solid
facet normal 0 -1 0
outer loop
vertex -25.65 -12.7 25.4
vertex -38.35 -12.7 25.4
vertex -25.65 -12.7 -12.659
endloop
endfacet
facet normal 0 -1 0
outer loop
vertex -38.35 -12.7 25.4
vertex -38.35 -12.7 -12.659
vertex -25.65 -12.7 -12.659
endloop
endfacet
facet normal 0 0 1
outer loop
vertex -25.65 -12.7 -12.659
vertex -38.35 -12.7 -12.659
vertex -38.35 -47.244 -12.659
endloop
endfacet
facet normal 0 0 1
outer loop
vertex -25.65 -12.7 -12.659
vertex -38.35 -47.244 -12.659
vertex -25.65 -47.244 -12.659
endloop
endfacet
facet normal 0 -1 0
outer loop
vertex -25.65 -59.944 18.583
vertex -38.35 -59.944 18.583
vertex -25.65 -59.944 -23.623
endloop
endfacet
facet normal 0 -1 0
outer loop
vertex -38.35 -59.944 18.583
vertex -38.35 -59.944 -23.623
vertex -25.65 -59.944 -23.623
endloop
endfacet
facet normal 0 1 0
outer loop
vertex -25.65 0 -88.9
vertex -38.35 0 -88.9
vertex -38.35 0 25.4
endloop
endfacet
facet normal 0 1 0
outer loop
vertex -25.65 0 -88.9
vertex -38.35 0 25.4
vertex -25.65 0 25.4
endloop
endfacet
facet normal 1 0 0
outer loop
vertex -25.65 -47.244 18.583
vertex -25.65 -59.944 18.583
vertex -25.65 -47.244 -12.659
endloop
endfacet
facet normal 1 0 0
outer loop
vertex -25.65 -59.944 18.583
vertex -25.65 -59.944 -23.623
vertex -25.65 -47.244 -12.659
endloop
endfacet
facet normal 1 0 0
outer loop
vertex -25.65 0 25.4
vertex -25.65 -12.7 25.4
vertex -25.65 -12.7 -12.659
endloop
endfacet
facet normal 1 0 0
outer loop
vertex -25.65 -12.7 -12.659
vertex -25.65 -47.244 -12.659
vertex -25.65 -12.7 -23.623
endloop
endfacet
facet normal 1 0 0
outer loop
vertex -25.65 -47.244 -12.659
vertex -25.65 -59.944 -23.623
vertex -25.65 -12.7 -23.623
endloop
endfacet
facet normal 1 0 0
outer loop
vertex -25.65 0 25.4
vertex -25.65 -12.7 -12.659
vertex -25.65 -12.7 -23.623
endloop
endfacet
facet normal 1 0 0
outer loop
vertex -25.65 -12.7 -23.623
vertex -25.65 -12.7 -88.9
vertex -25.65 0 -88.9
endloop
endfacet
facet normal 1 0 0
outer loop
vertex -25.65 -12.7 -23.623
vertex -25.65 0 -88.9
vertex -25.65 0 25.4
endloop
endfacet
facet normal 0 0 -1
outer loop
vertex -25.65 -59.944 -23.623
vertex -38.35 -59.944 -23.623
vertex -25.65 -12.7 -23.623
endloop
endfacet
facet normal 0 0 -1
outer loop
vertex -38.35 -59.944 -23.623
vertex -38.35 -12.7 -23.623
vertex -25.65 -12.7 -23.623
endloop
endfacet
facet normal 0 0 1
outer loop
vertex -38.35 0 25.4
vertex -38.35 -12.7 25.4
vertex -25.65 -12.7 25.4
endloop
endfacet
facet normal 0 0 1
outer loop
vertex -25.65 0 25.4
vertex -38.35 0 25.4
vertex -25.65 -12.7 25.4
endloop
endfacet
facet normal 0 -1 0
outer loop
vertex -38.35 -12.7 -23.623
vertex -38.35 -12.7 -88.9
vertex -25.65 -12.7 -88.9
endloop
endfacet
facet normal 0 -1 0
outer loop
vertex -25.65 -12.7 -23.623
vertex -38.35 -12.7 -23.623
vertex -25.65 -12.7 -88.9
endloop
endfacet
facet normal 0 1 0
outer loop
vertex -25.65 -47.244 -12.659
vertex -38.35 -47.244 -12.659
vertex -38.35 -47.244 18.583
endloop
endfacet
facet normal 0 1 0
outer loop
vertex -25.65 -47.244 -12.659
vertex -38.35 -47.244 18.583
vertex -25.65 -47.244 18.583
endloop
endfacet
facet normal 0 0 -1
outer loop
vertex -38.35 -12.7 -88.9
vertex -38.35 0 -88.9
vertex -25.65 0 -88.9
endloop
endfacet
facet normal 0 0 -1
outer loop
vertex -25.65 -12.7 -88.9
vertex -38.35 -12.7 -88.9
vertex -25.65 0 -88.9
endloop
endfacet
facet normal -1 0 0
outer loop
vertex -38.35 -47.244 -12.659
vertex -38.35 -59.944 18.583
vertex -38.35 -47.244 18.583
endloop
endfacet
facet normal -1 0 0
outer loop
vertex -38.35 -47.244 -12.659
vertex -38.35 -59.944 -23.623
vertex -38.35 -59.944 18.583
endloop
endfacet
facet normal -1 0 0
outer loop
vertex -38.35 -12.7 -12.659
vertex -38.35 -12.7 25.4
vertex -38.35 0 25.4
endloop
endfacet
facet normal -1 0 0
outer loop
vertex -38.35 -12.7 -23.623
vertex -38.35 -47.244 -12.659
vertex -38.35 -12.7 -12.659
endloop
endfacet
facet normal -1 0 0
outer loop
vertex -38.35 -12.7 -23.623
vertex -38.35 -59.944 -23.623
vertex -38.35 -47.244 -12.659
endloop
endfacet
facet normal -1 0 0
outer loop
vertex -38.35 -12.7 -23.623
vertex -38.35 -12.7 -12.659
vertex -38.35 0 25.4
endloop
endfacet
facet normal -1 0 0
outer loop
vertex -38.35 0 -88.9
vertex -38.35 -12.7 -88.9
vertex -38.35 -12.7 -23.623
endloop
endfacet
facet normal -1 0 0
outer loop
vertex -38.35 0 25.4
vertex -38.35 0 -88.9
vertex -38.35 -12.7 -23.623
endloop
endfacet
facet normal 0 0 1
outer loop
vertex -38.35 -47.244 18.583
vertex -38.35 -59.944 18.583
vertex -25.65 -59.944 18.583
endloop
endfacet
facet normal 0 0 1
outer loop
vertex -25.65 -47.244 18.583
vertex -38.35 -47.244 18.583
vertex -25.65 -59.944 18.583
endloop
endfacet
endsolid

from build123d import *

# Parameters (mm, degrees)
F0_W     = 12.7
F0_H     = 88.9
F1_DEPTH = 12.7
F2_W     = 12.7
F2_H     = 10.96398
F3_DEPTH = 30.734
F4_W     = 12.7
F4_H     = 12.7
F5_DEPTH = 25.4
F6_W     = 12.7
F6_H     = 10.96398
F7_DEPTH = 16.51
F8_W     = 12.7
F8_H     = 12.7
F9_DEPTH = 31.242


with BuildPart() as f1:
    # F0 (on Front) → F1 (new body)
    with BuildSketch(Plane.XZ):
        with Locations((-31.999755, -44.45)):
            Rectangle(F0_W, F0_H)
    extrude(amount=F1_DEPTH)

    # F2 (on face) → F3 (join)
    with BuildSketch(Plane.XZ.offset(12.7)):
        with Locations((-31.999755, -18.141449)):
            Rectangle(F2_W, F2_H)
    extrude(amount=F3_DEPTH)

    # F4 (on face) → F5 (join)
    with BuildSketch(Plane.XY):
        with Locations((-31.999755, -6.35)):
            Rectangle(F4_W, F4_H)
    extrude(amount=F5_DEPTH)

    # F6 (on face) → F7 (join)
    with BuildSketch(Plane.XZ.offset(43.434)):
        with Locations((-31.999755, -18.141449)):
            Rectangle(F6_W, F6_H)
    extrude(amount=F7_DEPTH)

    # F8 (on face) → F9 (join)
    with BuildSketch(Plane.XY.offset(-12.659459)):
        with Locations((-31.999755, -53.594)):
            Rectangle(F8_W, F8_H)
    extrude(amount=F9_DEPTH)


solid = f1.part
